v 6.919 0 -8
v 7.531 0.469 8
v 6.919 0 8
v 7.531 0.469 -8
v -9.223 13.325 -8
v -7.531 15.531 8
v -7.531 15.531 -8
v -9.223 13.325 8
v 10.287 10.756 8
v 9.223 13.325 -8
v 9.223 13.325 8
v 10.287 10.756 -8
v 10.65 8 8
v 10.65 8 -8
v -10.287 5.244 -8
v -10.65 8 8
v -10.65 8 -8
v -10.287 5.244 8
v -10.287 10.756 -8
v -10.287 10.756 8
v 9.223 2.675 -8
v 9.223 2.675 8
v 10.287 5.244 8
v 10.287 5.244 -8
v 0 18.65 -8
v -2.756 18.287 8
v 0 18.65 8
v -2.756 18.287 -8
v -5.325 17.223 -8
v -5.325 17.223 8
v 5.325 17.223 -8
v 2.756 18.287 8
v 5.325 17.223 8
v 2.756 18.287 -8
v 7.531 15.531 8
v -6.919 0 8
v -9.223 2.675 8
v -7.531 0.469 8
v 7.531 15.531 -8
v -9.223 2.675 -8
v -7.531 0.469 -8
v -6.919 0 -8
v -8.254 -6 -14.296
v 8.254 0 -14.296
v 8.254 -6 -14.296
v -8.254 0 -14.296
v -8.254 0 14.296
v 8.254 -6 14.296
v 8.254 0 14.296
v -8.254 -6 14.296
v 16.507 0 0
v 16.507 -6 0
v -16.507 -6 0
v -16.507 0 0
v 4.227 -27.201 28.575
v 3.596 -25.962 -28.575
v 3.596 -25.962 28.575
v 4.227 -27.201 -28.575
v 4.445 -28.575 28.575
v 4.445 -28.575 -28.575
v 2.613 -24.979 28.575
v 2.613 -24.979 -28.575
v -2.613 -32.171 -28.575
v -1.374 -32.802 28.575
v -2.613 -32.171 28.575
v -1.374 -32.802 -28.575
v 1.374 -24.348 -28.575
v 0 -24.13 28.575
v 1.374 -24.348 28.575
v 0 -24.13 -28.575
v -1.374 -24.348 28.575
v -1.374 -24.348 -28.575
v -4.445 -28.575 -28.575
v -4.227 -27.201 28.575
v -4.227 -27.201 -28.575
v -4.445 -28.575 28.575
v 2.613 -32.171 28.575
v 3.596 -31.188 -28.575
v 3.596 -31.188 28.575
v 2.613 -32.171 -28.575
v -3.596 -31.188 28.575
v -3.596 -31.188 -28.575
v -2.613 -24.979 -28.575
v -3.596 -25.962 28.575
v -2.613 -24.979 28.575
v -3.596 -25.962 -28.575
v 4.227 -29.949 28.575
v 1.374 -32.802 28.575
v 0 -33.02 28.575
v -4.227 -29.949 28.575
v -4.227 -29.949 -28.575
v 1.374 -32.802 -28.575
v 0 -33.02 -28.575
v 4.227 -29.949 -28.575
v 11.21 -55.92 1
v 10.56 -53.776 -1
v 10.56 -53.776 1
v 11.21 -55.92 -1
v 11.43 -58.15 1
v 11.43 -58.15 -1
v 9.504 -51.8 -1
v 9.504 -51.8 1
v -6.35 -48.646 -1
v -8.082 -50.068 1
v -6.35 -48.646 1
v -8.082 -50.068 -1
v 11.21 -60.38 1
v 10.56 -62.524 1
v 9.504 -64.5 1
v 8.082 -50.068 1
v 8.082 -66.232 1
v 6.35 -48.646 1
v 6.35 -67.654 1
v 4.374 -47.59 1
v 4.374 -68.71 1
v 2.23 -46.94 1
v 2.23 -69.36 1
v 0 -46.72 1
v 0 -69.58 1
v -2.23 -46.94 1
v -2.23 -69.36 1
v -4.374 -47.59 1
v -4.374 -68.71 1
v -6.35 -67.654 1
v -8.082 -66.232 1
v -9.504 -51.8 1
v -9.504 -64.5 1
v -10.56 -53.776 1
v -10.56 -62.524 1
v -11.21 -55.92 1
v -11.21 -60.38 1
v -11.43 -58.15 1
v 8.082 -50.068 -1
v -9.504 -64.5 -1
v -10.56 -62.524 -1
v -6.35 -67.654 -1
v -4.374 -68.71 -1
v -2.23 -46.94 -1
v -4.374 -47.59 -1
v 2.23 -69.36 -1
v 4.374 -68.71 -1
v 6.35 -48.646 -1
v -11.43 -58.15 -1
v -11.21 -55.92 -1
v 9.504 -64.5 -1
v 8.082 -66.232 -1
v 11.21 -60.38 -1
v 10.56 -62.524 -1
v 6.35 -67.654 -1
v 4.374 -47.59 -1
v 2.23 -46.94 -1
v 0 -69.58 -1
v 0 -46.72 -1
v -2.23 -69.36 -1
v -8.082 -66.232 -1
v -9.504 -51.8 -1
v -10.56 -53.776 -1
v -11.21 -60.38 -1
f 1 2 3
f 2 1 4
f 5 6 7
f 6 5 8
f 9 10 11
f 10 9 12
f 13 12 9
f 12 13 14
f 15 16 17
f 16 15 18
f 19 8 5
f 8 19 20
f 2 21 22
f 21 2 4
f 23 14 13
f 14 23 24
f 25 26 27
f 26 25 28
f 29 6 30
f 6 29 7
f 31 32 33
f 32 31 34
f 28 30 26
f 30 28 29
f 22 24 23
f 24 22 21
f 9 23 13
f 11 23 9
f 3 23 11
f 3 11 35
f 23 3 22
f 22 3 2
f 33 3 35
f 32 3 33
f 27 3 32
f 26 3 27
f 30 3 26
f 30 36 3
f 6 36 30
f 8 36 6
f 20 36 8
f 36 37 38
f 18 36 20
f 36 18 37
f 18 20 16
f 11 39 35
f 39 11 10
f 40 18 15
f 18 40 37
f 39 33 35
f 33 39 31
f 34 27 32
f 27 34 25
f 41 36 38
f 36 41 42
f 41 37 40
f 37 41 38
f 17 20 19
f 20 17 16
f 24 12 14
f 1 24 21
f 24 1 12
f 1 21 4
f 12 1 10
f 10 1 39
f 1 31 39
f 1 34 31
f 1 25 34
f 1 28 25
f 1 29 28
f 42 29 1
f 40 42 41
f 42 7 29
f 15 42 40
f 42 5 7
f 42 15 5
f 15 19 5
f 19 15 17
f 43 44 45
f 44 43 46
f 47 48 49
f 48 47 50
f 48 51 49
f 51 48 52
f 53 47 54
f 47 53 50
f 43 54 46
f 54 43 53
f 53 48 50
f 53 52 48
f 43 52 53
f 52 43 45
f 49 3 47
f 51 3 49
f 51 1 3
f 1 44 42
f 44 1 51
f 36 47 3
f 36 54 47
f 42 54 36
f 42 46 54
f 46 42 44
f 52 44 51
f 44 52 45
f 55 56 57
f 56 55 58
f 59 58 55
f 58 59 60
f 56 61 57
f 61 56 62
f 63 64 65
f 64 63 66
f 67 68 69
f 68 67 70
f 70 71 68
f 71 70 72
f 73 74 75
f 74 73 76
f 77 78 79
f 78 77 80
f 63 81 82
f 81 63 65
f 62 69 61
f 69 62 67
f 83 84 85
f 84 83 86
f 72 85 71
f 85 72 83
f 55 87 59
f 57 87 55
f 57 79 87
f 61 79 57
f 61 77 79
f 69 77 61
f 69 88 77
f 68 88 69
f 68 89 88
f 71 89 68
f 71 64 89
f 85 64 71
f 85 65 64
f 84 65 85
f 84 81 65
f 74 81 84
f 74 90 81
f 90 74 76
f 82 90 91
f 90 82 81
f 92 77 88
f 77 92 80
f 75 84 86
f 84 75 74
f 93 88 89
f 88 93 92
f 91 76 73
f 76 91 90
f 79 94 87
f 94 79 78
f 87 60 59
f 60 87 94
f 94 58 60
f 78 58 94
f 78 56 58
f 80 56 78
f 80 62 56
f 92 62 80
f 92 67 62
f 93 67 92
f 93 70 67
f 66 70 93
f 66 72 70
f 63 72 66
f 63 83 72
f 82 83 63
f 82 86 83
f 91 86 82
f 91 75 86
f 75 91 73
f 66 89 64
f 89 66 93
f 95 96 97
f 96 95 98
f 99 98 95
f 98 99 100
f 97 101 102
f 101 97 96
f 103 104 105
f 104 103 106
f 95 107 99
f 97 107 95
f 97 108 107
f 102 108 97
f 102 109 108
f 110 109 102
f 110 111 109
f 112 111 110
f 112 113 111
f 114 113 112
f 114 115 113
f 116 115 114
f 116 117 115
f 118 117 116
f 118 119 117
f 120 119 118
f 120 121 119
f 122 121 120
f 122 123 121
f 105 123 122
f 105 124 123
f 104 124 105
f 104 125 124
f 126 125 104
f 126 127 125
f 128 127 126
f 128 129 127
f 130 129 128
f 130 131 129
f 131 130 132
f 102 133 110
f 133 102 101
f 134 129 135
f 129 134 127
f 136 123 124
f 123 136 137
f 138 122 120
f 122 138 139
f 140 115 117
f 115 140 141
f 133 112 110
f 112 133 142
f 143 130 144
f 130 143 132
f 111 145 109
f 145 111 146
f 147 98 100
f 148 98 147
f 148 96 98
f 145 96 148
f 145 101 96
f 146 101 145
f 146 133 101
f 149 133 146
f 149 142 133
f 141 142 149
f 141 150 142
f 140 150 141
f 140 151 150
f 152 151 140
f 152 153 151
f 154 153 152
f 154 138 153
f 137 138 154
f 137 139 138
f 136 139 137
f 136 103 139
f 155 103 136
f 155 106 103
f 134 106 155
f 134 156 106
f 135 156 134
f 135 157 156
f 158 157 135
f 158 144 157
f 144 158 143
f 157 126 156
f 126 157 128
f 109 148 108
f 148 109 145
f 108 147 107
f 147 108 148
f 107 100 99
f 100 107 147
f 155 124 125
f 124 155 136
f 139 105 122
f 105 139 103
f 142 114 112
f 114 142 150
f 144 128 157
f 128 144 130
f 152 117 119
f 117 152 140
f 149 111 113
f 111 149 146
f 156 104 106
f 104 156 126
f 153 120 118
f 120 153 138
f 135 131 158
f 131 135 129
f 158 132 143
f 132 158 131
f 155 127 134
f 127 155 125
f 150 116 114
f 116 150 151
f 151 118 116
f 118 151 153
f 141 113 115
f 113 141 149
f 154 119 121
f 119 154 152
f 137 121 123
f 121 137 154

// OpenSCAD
// Auto-generated by scripts/author_from_manifest.py (Phase D.3).
// Source: data/phase_d_manifest.json (sku_intent='tyco-ty3251-pendent-200f').
// Do not hand-edit — regenerate from the manifest.
//
// @part tyco_ty3251_pendent_200f
// @kind sprinkler_head
// @category head.pendant.k56
// @display-name "Tyco TY3251 Pendent K5.6 SR 200°F"
// @mfg tyco_fire_protection
// @mfg-pn TY3251
// @listing UL FM
// @hazard-classes LH OH1
// @price-usd 14.20
// @install-minutes 8
// @crew journeyman
// @k-factor 5.6
// @orientation pendant
// @response standard
// @temperature 200F
// @param size_in number default=0.5 label="Size" unit="in"
// @port inlet position=[0,0.014,0] direction=[0,1,0] style=NPT_threaded size_in=0.5 role=drop

size_in = 0.5;
k_factor = 5.6;

length_mm   = 57.15;
body_dia_mm = 25.40;
thread_od   = 21.3;
thread_len  = 16;
deflector_d = body_dia_mm * 0.9;

 union() {
    translate([0, thread_len/2, 0])
        cylinder(h = thread_len, d = thread_od, center = true, $fn = 24);
    translate([0, -3, 0])
        rotate([90, 0, 0])
        cylinder(h = 6, d = thread_od * 1.55, $fn = 6, center = true);
    translate([0, -length_mm/2, 0])
        cylinder(h = length_mm, d = body_dia_mm * 0.35, center = true, $fn = 20);
    translate([0, -length_mm - 1, 0])
        cylinder(h = 2, d = deflector_d, center = true, $fn = 32);
}
